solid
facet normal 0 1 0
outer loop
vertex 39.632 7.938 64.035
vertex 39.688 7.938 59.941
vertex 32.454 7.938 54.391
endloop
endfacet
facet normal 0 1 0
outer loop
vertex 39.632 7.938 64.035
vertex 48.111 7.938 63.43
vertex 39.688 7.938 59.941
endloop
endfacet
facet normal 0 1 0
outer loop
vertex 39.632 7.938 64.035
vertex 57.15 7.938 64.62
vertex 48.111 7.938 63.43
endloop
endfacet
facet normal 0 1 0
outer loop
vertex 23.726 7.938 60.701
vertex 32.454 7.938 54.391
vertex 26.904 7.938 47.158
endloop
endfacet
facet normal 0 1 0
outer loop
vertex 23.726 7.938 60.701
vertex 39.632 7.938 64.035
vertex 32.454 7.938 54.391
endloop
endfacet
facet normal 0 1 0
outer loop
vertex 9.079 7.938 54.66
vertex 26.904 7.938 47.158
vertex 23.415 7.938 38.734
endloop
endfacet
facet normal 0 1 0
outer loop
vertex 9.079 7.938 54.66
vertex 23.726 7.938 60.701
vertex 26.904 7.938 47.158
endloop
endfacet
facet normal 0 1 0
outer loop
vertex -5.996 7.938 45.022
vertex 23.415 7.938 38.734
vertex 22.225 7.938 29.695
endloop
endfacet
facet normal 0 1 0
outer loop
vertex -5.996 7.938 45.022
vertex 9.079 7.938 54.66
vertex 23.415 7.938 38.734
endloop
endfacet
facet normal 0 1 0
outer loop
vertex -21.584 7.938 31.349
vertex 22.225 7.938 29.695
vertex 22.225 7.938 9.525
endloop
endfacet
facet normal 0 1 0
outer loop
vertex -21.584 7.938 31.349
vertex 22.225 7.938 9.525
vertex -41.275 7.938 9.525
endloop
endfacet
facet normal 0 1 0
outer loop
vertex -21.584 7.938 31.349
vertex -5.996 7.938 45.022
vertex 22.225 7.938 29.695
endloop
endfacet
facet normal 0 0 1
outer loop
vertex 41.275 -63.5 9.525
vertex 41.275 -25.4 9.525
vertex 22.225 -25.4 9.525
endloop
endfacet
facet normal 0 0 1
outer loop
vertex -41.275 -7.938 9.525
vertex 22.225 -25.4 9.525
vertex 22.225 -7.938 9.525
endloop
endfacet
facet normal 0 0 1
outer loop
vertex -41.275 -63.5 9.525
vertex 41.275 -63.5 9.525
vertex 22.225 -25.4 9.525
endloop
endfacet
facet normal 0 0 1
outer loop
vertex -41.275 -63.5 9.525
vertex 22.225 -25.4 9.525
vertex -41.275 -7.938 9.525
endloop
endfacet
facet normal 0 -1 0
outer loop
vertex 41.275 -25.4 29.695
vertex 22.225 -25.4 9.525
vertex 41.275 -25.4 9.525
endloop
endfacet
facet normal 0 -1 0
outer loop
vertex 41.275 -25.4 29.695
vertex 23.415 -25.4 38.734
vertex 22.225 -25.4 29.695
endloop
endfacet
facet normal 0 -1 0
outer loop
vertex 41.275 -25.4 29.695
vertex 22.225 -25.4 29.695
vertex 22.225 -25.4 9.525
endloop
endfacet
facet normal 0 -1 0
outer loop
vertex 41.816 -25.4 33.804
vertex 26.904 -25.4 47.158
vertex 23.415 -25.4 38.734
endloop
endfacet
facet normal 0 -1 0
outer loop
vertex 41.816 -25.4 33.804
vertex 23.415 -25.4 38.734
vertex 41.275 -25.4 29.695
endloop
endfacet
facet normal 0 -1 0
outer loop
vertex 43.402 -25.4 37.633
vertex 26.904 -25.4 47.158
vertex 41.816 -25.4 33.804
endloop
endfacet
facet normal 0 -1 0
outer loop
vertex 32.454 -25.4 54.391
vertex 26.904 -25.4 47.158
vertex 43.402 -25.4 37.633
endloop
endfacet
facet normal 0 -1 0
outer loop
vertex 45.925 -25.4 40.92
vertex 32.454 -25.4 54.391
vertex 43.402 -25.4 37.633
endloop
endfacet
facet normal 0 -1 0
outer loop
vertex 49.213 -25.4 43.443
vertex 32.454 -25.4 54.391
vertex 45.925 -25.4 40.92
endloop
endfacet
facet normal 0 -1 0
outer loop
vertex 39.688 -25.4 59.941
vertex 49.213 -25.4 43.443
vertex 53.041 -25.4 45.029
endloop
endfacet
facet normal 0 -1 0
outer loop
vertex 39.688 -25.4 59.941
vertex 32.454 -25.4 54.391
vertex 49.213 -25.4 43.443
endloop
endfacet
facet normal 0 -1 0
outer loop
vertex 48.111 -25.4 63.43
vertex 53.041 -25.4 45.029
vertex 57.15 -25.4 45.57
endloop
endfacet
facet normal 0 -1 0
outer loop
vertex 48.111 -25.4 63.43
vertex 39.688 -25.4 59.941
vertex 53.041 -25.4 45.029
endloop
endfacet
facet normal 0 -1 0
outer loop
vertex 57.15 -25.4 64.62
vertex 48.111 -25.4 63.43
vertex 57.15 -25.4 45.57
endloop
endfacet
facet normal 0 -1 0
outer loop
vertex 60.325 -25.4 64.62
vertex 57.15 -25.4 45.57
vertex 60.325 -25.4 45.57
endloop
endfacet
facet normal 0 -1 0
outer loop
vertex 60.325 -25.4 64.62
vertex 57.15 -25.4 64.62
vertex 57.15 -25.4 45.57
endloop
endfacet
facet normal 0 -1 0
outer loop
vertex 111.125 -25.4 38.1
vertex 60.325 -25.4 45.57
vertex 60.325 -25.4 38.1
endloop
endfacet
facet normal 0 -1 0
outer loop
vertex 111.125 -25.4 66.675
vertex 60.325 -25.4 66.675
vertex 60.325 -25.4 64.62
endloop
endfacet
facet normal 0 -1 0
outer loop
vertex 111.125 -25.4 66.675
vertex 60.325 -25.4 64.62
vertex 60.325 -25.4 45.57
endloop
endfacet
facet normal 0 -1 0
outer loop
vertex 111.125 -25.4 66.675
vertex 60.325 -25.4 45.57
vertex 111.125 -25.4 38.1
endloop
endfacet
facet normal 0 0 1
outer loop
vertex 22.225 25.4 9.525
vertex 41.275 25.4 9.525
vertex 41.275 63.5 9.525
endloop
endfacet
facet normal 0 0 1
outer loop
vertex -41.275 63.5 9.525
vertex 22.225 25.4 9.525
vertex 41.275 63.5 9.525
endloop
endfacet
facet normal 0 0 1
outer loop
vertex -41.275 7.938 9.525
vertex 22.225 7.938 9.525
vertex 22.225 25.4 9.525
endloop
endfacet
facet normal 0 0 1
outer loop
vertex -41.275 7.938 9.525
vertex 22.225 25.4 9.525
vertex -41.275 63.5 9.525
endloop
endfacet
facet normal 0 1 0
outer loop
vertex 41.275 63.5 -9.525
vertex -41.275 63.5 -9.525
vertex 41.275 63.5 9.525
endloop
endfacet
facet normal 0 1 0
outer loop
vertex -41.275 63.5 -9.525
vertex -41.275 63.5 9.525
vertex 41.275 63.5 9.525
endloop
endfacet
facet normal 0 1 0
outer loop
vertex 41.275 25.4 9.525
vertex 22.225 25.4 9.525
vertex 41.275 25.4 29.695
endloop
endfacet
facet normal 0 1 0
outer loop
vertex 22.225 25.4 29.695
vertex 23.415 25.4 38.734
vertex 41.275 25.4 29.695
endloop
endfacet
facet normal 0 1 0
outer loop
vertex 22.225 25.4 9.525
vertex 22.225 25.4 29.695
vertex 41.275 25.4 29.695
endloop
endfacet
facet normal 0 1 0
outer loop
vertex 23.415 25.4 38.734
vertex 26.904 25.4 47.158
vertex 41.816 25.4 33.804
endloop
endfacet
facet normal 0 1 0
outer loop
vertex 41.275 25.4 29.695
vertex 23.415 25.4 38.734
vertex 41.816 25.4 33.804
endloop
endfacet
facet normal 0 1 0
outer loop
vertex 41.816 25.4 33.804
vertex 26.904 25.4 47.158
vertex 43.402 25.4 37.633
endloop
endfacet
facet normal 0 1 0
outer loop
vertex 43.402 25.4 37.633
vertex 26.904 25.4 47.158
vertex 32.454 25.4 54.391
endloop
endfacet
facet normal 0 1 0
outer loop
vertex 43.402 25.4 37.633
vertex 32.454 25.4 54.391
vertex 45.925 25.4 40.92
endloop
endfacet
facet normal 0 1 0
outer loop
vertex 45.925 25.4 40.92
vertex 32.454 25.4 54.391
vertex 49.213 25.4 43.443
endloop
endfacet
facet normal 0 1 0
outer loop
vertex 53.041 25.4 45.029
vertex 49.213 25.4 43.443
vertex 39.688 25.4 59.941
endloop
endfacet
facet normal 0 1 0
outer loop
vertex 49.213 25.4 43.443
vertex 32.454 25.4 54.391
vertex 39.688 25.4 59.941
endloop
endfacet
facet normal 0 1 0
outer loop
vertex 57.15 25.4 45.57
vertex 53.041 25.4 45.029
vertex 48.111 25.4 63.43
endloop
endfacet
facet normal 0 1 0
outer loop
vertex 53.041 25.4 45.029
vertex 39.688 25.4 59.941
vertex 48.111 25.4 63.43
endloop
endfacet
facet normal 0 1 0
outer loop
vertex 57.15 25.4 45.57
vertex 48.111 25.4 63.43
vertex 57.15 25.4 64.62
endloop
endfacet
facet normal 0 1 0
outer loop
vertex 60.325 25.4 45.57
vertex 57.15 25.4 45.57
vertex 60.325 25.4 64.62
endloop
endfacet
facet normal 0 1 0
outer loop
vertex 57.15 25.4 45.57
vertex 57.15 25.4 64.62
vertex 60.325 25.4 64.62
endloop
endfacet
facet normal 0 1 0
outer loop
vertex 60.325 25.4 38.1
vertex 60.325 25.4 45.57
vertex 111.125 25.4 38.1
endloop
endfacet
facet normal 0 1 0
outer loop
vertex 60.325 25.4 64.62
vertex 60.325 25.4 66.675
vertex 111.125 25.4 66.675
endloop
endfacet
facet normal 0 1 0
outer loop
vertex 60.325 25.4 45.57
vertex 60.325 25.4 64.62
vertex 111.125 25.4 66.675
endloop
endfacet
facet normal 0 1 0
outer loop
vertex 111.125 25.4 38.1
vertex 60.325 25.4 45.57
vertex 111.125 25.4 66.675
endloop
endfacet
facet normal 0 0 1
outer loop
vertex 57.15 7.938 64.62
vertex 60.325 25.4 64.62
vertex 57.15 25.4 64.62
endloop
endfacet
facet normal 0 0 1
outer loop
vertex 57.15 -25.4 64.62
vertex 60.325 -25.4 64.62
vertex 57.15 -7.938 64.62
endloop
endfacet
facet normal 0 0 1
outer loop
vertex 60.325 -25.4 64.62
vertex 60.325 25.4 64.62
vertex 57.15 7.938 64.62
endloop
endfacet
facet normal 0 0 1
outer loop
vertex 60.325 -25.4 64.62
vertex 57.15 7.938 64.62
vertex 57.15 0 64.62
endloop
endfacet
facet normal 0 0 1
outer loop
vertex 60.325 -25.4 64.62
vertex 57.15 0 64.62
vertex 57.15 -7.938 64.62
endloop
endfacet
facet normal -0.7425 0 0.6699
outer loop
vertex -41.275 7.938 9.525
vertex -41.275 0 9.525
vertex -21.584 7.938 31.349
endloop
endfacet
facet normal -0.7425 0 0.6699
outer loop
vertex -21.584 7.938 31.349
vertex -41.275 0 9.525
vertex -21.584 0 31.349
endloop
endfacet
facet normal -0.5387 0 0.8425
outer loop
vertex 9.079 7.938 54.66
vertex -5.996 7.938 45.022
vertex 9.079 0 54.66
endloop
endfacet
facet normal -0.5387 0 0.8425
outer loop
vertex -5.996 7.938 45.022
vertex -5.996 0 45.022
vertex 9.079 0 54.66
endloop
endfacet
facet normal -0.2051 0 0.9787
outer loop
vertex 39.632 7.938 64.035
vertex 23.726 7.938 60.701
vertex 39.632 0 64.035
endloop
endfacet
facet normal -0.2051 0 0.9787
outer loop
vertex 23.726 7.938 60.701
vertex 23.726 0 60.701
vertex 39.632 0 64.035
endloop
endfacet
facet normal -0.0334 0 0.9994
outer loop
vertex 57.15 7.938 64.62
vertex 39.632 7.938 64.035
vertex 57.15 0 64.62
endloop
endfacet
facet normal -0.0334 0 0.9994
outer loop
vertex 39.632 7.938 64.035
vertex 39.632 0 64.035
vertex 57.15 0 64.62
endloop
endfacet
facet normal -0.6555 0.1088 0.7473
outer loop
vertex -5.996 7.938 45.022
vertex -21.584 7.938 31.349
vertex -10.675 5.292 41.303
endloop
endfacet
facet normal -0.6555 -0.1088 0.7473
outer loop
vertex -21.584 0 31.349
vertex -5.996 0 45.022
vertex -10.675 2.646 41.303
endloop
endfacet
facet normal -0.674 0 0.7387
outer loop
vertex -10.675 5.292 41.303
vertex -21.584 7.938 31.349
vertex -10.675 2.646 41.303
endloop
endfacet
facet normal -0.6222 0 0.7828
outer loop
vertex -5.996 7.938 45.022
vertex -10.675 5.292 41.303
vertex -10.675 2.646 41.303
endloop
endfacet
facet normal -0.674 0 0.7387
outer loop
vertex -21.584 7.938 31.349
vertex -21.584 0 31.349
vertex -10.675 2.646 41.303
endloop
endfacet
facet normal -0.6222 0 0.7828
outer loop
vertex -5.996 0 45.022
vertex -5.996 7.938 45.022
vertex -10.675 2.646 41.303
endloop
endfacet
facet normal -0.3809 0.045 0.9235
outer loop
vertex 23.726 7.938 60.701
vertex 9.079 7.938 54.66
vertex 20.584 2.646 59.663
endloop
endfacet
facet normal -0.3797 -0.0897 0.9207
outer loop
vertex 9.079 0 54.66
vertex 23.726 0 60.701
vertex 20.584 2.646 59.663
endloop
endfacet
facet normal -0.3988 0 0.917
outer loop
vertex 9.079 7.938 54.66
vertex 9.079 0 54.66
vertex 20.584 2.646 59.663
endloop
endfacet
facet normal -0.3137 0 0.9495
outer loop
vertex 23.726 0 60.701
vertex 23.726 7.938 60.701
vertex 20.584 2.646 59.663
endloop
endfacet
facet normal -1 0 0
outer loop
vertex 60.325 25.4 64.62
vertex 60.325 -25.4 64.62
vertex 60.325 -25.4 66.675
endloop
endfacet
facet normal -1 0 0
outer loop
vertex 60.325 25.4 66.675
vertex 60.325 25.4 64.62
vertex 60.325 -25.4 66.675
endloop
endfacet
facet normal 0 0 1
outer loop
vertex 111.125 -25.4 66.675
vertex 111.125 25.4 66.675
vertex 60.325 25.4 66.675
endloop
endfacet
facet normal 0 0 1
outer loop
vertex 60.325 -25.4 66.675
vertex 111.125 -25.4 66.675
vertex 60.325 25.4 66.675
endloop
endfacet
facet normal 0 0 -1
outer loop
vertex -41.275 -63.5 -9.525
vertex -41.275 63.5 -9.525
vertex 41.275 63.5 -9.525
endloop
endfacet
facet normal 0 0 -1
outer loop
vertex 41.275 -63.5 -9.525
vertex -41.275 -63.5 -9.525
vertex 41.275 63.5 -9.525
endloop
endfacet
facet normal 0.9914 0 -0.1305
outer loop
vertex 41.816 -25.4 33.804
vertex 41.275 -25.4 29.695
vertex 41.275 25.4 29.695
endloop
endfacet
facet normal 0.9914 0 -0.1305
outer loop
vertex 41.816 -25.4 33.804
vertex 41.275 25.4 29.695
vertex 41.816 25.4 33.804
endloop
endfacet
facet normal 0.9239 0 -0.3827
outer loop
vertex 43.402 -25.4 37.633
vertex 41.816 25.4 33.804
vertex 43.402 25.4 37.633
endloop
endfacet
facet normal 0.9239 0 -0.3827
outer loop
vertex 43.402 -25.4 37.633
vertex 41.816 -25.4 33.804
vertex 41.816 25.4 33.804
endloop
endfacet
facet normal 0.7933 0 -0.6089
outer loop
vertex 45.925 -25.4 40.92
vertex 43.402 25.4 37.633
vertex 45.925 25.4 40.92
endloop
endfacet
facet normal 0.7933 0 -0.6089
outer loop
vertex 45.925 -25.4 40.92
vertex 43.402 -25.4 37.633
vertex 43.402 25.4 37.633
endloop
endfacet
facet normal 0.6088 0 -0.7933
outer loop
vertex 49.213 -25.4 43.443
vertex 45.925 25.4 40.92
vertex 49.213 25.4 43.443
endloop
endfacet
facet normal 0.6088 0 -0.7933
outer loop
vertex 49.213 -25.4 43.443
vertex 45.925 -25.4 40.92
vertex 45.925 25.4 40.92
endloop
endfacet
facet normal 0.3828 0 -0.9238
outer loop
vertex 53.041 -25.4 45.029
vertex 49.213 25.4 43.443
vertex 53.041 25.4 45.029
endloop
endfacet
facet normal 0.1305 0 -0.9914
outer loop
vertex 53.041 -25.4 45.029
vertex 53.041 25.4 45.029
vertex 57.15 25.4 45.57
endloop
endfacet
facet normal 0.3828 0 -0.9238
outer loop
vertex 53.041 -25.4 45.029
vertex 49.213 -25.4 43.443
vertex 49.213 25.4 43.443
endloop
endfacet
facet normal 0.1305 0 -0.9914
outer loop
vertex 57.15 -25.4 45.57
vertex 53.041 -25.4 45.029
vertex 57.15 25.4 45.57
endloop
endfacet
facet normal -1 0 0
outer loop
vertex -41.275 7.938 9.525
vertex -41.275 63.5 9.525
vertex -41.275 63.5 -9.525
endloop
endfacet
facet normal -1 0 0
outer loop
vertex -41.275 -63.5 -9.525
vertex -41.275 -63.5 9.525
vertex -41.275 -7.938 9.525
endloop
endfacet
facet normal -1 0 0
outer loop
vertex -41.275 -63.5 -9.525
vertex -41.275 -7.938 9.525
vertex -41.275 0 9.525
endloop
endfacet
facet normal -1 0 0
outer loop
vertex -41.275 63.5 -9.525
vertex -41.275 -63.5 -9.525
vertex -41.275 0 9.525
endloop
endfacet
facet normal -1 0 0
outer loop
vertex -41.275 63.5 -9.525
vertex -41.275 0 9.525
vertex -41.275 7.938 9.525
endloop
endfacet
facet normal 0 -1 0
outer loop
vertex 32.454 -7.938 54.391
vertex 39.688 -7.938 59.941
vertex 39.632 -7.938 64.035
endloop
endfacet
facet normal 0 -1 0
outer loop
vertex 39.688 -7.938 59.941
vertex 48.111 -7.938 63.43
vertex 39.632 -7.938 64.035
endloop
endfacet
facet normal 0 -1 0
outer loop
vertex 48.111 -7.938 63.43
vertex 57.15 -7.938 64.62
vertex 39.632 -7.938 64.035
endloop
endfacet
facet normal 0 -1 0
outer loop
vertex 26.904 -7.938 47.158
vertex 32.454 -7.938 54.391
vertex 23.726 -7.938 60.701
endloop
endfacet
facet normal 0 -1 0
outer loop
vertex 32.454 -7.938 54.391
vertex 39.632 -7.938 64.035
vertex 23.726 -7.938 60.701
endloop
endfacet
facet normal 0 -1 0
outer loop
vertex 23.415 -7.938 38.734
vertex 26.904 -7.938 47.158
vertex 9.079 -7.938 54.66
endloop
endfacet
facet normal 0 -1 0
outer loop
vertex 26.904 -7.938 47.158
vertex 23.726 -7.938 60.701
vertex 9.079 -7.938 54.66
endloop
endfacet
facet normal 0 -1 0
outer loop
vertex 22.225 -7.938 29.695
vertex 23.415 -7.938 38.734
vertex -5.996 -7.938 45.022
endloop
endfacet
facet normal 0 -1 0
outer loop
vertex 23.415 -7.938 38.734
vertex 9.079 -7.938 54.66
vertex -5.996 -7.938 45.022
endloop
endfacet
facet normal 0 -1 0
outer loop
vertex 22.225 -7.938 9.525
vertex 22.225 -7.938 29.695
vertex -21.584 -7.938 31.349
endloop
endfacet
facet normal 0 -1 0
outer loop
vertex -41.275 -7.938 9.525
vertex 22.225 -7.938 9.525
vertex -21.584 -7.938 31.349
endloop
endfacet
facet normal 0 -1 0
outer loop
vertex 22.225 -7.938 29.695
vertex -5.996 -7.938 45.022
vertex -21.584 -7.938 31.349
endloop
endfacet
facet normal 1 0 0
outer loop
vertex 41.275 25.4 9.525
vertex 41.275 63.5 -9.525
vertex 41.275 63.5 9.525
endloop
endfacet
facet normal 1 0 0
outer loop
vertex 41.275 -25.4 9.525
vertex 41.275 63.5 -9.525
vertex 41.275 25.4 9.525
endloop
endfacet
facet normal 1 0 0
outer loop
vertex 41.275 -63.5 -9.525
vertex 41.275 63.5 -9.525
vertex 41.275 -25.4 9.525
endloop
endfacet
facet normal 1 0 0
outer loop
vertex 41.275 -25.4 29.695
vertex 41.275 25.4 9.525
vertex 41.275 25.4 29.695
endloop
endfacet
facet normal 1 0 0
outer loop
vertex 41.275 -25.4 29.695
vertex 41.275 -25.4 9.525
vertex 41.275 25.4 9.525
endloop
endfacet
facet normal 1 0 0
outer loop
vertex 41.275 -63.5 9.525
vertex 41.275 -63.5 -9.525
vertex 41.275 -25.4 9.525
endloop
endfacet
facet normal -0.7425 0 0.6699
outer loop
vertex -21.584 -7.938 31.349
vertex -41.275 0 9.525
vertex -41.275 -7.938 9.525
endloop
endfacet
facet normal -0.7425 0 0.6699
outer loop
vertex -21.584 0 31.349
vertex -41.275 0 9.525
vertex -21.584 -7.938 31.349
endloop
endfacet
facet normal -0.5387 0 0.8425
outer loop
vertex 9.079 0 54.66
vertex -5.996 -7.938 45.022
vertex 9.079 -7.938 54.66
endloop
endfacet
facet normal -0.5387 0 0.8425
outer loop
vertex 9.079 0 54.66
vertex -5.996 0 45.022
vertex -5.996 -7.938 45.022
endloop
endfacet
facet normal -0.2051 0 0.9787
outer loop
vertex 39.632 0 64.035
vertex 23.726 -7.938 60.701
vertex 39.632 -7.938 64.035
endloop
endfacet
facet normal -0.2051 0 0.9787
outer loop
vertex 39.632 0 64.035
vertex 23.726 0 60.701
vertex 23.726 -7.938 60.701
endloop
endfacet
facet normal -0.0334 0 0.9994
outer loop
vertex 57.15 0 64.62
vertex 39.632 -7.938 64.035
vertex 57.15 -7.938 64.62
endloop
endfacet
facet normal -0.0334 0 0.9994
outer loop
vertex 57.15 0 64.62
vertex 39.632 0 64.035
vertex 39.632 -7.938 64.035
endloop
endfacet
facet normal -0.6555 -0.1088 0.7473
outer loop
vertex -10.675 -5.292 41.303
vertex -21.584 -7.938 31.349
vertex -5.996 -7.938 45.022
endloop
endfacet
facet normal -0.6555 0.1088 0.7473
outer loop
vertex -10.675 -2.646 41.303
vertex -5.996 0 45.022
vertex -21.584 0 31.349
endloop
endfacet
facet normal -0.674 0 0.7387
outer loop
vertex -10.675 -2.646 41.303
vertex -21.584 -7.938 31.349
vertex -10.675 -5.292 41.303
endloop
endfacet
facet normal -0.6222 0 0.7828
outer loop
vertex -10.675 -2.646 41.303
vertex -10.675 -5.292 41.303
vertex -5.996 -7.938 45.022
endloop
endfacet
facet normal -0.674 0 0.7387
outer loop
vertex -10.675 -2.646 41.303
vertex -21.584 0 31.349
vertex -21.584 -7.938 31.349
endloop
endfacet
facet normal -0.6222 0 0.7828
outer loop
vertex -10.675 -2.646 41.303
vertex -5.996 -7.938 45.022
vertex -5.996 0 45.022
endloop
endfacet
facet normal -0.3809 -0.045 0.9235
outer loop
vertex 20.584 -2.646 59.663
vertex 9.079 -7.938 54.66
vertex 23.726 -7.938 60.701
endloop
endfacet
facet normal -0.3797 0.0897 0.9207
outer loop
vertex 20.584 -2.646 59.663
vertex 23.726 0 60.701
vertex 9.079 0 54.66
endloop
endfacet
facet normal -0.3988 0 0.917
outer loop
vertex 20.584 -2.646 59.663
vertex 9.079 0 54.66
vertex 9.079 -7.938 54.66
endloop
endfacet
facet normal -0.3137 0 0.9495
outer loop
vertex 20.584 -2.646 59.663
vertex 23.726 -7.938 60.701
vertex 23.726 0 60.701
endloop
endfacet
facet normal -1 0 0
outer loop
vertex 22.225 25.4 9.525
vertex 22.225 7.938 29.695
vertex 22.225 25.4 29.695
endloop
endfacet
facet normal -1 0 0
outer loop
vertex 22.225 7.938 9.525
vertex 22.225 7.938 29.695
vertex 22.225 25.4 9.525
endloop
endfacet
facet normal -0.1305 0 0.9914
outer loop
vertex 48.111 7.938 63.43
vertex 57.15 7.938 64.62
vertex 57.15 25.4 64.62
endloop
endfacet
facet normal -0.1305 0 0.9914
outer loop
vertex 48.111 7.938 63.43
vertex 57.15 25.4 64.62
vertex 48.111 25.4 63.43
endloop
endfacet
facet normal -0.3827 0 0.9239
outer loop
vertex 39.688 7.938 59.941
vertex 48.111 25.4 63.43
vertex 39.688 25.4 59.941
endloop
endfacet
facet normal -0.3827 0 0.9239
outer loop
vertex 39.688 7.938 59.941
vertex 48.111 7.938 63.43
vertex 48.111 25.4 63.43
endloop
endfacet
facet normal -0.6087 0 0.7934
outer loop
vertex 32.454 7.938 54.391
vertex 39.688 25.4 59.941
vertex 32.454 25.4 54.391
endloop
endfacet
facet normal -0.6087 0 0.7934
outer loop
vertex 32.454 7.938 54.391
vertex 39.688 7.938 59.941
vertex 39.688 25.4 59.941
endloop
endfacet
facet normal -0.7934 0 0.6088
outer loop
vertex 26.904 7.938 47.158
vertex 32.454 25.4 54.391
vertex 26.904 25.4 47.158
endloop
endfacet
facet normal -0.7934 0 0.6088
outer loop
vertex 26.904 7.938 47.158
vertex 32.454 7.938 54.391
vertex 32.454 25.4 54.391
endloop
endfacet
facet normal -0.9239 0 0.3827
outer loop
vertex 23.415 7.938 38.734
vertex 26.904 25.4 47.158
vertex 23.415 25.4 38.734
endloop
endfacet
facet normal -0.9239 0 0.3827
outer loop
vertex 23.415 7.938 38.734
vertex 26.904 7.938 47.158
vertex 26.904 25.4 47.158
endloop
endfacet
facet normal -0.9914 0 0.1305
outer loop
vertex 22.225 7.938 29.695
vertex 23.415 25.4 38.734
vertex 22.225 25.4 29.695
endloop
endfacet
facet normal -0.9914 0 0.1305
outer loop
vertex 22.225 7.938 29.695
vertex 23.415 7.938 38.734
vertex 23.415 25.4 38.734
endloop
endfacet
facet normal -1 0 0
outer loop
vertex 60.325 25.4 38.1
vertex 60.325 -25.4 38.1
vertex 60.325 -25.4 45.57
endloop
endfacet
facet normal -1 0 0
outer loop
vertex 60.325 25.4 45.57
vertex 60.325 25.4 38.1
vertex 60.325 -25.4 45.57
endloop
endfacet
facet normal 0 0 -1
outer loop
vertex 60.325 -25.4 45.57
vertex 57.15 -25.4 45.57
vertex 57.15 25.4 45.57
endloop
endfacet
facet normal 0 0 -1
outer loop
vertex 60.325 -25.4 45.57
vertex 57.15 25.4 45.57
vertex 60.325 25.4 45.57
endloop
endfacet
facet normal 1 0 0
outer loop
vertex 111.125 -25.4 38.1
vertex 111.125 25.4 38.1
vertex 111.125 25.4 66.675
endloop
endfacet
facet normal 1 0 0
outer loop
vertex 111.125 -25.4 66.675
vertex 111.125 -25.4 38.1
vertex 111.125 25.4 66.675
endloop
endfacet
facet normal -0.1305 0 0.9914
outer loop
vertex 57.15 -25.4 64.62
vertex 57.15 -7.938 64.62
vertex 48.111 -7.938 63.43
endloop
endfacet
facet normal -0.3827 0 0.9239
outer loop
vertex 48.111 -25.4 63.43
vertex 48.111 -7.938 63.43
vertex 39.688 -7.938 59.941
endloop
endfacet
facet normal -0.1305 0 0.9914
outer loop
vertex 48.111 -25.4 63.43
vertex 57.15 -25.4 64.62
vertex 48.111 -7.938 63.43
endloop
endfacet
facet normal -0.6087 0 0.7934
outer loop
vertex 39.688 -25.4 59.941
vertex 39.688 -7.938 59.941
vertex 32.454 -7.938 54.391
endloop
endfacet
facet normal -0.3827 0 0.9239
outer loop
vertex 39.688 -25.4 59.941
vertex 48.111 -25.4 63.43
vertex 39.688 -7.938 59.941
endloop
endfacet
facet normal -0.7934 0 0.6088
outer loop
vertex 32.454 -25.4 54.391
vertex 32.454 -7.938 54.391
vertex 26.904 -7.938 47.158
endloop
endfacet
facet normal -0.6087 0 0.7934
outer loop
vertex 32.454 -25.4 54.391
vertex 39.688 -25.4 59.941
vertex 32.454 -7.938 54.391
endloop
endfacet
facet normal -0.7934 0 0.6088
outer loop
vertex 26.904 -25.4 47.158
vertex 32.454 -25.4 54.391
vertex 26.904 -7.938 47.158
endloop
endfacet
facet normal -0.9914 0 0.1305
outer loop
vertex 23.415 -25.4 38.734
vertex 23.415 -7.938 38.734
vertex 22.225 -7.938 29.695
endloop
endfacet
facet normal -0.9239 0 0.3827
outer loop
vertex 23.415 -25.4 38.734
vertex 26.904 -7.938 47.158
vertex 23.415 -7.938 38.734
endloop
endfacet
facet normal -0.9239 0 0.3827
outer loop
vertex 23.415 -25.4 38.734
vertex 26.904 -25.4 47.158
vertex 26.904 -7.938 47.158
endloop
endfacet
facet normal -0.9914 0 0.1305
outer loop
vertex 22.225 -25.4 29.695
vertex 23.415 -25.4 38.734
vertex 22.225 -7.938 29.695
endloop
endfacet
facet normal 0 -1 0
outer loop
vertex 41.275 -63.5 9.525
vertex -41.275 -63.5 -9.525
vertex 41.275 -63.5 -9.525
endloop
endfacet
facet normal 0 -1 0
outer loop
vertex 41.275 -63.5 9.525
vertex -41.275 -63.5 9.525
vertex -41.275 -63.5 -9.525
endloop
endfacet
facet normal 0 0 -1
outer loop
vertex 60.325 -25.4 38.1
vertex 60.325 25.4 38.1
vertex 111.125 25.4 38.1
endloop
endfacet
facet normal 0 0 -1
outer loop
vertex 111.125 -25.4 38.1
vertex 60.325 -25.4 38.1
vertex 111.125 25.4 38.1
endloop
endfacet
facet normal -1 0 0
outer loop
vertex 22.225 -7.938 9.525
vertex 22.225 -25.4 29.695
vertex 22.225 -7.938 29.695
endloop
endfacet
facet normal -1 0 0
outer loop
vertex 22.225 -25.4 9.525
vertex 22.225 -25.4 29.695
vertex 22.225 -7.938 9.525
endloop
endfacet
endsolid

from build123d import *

# Parameters (mm, degrees)
F1_DEPTH = 63.5
F0_W     = 25.4
F0_H     = 19.05
F0_H_2   = 7.4700546124
F0_H_3   = 2.0549453876
F2_DEPTH = 25.4
F3_DEPTH = 7.9375


with BuildPart() as f1:
    # F0 (on Front) → F1 (new body, symmetric)
    with BuildSketch(Plane.XZ):
        Polygon((-41.275, -9.525), (41.275, -9.525), (41.275, 9.525), (22.225, 9.525), (-41.275, 9.525), align=None)
    extrude(amount=F1_DEPTH, both=True)

    # F0 (on Front) → F2 (join, symmetric)
    with BuildSketch(Plane.XZ):
        with BuildLine():
            Line((22.225, 9.525), (41.275, 9.525))
            Line((41.275, 9.525), (41.275, 29.6950546124))
            ThreePointArc((41.275, 29.6950546124), (45.9246798487, 40.9203747637), (57.15, 45.5700546124))
            Line((57.15, 45.5700546124), (60.325, 45.5700546124))
            Line((60.325, 45.5700546124), (60.325, 64.6200546124))
            Line((60.325, 64.6200546124), (57.15, 64.6200546124))
            ThreePointArc((57.15, 64.6200546124), (32.4542956671, 54.3907589453), (22.225, 29.6950546124))
            Line((22.225, 29.6950546124), (22.225, 9.525))
        make_face()
        Polygon((85.725, 66.675), (85.725, 64.6200546124), (85.725, 45.5700546124), (85.725, 38.1), (111.125, 38.1), (111.125, 66.675), align=None)
        with Locations((73.025, 55.0950546124)):
            Rectangle(F0_W, F0_H)
        with Locations((73.025, 41.8350273062)):
            Rectangle(F0_W, F0_H_2)
        with Locations((73.025, 65.6475273062)):
            Rectangle(F0_W, F0_H_3)
    extrude(amount=F2_DEPTH, both=True)

    # F0 (on Front) → F3 (join, symmetric)
    with BuildSketch(Plane.XZ):
        with BuildLine():
            add(Edge.make_bspline(
                [(-41.275, 9.525), (-9.4534000382, 48.0157919228), (16.3796581328, 66.3610100746), (57.15, 64.6200546124)],
                knots=[0, 0, 0, 0, 112.7960356916, 112.7960356916, 112.7960356916, 112.7960356916], degree=3))
            Line((-41.275, 9.525), (22.225, 9.525))
            Line((22.225, 9.525), (22.225, 29.6950546124))
            ThreePointArc((22.225, 29.6950546124), (32.4542956671, 54.3907589453), (57.15, 64.6200546124))
        make_face()
    extrude(amount=F3_DEPTH, both=True)


solid = f1.part
